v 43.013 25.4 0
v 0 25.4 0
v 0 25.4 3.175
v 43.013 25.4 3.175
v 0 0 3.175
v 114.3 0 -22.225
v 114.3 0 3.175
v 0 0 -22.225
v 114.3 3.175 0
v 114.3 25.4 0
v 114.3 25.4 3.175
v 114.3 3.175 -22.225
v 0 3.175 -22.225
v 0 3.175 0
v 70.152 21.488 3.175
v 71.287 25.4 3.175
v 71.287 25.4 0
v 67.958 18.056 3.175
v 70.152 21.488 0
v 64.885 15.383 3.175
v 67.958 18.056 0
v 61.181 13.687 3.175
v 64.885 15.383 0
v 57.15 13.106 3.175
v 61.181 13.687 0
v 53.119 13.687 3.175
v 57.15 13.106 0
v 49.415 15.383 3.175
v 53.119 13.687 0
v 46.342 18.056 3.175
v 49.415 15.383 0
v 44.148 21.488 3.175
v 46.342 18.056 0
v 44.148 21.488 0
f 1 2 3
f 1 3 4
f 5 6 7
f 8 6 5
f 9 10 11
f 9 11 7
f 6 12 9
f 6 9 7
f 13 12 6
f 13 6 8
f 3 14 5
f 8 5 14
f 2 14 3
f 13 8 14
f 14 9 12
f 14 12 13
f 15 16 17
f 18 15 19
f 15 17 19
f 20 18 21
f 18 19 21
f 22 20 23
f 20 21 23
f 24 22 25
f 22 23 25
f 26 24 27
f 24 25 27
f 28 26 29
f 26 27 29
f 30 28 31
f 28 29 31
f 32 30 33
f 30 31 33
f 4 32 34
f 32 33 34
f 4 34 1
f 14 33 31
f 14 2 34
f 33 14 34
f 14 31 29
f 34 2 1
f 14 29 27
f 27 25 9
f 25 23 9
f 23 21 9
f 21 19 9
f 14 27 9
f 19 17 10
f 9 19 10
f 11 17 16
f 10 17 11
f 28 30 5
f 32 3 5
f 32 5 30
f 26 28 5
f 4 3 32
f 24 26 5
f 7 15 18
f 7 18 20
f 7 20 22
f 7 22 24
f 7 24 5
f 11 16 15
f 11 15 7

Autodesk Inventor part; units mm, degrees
ref_plane "YZ Plane" through (0, 0, 0) normal (1, 0, 0) x (0, 1, 0)
ref_plane "XZ Plane" through (0, 0, 0) normal (0, 1, 0) x (-1, 0, 0)
ref_plane "XY Plane" through (0, 0, 0) normal (0, 0, 1) x (1, 0, 0)
sketch "Sketch1" plane through (0, 0, 0) normal (0, 0, 1) x (1, 0, 0)
  line L0 (0, 0) -> (0, 25.4)
  line L1 (0, 25.4) -> (114.3, 25.4)
  line L2 (114.3, 25.4) -> (114.3, 0)
  line L3 (114.3, 0) -> (0, 0)
  dimension "d0" = 25.4
  dimension "d1" = 114.3
extrude "Extrusion1" add sketch "Sketch1" along normal blind 3.175
sketch "Sketch2" plane through (0, 0, 0) normal (0, 0, -1) x (-1, 0, 0)
  line L0 (-114.3, 0) -> (-114.3, 3.175)
  line L1 (-114.3, 0) -> (-114.3, 25.4) projected
  line L2 (-114.3, 3.175) -> (0, 3.175)
  line L3 (0, 25.4) -> (0, 0) projected
  line L4 (0, 3.175) -> (0, 0)
  line L5 (0, 0) -> (-114.3, 0)
  line L6 (0, 0) -> (-114.3, 0) projected
  line L7 (0, 12.7) -> (-19.05, 12.7)
  line L8 (-114.3, 25.4) -> (-114.3, 22.225)
  line L9 (-114.3, 25.4) -> (-114.3, 0)
  line L10 (0, 0) -> (0, 25.4)
  line L11 (0, 22.225) -> (0, 25.4)
  dimension "d4" = 3.175
extrude "Extrusion2" add sketch "Sketch2" along normal blind 22.225
sketch "Sketch5" plane through (0, 0, 3.175) normal (0, 0, 1) x (1, 0, 0)
  line L0 (0, 0) -> (114.3, 0) projected
  line L1 (57.15, 0) -> (57.15, 27.3812)
  dimension "d18" = 27.3812
hole "Hole2" at (57.15, 27.3812, 3.175) direction (0, 0, -1) diameter 28.5496 end through all
properties part number "shaft chassis bracket with hole"
